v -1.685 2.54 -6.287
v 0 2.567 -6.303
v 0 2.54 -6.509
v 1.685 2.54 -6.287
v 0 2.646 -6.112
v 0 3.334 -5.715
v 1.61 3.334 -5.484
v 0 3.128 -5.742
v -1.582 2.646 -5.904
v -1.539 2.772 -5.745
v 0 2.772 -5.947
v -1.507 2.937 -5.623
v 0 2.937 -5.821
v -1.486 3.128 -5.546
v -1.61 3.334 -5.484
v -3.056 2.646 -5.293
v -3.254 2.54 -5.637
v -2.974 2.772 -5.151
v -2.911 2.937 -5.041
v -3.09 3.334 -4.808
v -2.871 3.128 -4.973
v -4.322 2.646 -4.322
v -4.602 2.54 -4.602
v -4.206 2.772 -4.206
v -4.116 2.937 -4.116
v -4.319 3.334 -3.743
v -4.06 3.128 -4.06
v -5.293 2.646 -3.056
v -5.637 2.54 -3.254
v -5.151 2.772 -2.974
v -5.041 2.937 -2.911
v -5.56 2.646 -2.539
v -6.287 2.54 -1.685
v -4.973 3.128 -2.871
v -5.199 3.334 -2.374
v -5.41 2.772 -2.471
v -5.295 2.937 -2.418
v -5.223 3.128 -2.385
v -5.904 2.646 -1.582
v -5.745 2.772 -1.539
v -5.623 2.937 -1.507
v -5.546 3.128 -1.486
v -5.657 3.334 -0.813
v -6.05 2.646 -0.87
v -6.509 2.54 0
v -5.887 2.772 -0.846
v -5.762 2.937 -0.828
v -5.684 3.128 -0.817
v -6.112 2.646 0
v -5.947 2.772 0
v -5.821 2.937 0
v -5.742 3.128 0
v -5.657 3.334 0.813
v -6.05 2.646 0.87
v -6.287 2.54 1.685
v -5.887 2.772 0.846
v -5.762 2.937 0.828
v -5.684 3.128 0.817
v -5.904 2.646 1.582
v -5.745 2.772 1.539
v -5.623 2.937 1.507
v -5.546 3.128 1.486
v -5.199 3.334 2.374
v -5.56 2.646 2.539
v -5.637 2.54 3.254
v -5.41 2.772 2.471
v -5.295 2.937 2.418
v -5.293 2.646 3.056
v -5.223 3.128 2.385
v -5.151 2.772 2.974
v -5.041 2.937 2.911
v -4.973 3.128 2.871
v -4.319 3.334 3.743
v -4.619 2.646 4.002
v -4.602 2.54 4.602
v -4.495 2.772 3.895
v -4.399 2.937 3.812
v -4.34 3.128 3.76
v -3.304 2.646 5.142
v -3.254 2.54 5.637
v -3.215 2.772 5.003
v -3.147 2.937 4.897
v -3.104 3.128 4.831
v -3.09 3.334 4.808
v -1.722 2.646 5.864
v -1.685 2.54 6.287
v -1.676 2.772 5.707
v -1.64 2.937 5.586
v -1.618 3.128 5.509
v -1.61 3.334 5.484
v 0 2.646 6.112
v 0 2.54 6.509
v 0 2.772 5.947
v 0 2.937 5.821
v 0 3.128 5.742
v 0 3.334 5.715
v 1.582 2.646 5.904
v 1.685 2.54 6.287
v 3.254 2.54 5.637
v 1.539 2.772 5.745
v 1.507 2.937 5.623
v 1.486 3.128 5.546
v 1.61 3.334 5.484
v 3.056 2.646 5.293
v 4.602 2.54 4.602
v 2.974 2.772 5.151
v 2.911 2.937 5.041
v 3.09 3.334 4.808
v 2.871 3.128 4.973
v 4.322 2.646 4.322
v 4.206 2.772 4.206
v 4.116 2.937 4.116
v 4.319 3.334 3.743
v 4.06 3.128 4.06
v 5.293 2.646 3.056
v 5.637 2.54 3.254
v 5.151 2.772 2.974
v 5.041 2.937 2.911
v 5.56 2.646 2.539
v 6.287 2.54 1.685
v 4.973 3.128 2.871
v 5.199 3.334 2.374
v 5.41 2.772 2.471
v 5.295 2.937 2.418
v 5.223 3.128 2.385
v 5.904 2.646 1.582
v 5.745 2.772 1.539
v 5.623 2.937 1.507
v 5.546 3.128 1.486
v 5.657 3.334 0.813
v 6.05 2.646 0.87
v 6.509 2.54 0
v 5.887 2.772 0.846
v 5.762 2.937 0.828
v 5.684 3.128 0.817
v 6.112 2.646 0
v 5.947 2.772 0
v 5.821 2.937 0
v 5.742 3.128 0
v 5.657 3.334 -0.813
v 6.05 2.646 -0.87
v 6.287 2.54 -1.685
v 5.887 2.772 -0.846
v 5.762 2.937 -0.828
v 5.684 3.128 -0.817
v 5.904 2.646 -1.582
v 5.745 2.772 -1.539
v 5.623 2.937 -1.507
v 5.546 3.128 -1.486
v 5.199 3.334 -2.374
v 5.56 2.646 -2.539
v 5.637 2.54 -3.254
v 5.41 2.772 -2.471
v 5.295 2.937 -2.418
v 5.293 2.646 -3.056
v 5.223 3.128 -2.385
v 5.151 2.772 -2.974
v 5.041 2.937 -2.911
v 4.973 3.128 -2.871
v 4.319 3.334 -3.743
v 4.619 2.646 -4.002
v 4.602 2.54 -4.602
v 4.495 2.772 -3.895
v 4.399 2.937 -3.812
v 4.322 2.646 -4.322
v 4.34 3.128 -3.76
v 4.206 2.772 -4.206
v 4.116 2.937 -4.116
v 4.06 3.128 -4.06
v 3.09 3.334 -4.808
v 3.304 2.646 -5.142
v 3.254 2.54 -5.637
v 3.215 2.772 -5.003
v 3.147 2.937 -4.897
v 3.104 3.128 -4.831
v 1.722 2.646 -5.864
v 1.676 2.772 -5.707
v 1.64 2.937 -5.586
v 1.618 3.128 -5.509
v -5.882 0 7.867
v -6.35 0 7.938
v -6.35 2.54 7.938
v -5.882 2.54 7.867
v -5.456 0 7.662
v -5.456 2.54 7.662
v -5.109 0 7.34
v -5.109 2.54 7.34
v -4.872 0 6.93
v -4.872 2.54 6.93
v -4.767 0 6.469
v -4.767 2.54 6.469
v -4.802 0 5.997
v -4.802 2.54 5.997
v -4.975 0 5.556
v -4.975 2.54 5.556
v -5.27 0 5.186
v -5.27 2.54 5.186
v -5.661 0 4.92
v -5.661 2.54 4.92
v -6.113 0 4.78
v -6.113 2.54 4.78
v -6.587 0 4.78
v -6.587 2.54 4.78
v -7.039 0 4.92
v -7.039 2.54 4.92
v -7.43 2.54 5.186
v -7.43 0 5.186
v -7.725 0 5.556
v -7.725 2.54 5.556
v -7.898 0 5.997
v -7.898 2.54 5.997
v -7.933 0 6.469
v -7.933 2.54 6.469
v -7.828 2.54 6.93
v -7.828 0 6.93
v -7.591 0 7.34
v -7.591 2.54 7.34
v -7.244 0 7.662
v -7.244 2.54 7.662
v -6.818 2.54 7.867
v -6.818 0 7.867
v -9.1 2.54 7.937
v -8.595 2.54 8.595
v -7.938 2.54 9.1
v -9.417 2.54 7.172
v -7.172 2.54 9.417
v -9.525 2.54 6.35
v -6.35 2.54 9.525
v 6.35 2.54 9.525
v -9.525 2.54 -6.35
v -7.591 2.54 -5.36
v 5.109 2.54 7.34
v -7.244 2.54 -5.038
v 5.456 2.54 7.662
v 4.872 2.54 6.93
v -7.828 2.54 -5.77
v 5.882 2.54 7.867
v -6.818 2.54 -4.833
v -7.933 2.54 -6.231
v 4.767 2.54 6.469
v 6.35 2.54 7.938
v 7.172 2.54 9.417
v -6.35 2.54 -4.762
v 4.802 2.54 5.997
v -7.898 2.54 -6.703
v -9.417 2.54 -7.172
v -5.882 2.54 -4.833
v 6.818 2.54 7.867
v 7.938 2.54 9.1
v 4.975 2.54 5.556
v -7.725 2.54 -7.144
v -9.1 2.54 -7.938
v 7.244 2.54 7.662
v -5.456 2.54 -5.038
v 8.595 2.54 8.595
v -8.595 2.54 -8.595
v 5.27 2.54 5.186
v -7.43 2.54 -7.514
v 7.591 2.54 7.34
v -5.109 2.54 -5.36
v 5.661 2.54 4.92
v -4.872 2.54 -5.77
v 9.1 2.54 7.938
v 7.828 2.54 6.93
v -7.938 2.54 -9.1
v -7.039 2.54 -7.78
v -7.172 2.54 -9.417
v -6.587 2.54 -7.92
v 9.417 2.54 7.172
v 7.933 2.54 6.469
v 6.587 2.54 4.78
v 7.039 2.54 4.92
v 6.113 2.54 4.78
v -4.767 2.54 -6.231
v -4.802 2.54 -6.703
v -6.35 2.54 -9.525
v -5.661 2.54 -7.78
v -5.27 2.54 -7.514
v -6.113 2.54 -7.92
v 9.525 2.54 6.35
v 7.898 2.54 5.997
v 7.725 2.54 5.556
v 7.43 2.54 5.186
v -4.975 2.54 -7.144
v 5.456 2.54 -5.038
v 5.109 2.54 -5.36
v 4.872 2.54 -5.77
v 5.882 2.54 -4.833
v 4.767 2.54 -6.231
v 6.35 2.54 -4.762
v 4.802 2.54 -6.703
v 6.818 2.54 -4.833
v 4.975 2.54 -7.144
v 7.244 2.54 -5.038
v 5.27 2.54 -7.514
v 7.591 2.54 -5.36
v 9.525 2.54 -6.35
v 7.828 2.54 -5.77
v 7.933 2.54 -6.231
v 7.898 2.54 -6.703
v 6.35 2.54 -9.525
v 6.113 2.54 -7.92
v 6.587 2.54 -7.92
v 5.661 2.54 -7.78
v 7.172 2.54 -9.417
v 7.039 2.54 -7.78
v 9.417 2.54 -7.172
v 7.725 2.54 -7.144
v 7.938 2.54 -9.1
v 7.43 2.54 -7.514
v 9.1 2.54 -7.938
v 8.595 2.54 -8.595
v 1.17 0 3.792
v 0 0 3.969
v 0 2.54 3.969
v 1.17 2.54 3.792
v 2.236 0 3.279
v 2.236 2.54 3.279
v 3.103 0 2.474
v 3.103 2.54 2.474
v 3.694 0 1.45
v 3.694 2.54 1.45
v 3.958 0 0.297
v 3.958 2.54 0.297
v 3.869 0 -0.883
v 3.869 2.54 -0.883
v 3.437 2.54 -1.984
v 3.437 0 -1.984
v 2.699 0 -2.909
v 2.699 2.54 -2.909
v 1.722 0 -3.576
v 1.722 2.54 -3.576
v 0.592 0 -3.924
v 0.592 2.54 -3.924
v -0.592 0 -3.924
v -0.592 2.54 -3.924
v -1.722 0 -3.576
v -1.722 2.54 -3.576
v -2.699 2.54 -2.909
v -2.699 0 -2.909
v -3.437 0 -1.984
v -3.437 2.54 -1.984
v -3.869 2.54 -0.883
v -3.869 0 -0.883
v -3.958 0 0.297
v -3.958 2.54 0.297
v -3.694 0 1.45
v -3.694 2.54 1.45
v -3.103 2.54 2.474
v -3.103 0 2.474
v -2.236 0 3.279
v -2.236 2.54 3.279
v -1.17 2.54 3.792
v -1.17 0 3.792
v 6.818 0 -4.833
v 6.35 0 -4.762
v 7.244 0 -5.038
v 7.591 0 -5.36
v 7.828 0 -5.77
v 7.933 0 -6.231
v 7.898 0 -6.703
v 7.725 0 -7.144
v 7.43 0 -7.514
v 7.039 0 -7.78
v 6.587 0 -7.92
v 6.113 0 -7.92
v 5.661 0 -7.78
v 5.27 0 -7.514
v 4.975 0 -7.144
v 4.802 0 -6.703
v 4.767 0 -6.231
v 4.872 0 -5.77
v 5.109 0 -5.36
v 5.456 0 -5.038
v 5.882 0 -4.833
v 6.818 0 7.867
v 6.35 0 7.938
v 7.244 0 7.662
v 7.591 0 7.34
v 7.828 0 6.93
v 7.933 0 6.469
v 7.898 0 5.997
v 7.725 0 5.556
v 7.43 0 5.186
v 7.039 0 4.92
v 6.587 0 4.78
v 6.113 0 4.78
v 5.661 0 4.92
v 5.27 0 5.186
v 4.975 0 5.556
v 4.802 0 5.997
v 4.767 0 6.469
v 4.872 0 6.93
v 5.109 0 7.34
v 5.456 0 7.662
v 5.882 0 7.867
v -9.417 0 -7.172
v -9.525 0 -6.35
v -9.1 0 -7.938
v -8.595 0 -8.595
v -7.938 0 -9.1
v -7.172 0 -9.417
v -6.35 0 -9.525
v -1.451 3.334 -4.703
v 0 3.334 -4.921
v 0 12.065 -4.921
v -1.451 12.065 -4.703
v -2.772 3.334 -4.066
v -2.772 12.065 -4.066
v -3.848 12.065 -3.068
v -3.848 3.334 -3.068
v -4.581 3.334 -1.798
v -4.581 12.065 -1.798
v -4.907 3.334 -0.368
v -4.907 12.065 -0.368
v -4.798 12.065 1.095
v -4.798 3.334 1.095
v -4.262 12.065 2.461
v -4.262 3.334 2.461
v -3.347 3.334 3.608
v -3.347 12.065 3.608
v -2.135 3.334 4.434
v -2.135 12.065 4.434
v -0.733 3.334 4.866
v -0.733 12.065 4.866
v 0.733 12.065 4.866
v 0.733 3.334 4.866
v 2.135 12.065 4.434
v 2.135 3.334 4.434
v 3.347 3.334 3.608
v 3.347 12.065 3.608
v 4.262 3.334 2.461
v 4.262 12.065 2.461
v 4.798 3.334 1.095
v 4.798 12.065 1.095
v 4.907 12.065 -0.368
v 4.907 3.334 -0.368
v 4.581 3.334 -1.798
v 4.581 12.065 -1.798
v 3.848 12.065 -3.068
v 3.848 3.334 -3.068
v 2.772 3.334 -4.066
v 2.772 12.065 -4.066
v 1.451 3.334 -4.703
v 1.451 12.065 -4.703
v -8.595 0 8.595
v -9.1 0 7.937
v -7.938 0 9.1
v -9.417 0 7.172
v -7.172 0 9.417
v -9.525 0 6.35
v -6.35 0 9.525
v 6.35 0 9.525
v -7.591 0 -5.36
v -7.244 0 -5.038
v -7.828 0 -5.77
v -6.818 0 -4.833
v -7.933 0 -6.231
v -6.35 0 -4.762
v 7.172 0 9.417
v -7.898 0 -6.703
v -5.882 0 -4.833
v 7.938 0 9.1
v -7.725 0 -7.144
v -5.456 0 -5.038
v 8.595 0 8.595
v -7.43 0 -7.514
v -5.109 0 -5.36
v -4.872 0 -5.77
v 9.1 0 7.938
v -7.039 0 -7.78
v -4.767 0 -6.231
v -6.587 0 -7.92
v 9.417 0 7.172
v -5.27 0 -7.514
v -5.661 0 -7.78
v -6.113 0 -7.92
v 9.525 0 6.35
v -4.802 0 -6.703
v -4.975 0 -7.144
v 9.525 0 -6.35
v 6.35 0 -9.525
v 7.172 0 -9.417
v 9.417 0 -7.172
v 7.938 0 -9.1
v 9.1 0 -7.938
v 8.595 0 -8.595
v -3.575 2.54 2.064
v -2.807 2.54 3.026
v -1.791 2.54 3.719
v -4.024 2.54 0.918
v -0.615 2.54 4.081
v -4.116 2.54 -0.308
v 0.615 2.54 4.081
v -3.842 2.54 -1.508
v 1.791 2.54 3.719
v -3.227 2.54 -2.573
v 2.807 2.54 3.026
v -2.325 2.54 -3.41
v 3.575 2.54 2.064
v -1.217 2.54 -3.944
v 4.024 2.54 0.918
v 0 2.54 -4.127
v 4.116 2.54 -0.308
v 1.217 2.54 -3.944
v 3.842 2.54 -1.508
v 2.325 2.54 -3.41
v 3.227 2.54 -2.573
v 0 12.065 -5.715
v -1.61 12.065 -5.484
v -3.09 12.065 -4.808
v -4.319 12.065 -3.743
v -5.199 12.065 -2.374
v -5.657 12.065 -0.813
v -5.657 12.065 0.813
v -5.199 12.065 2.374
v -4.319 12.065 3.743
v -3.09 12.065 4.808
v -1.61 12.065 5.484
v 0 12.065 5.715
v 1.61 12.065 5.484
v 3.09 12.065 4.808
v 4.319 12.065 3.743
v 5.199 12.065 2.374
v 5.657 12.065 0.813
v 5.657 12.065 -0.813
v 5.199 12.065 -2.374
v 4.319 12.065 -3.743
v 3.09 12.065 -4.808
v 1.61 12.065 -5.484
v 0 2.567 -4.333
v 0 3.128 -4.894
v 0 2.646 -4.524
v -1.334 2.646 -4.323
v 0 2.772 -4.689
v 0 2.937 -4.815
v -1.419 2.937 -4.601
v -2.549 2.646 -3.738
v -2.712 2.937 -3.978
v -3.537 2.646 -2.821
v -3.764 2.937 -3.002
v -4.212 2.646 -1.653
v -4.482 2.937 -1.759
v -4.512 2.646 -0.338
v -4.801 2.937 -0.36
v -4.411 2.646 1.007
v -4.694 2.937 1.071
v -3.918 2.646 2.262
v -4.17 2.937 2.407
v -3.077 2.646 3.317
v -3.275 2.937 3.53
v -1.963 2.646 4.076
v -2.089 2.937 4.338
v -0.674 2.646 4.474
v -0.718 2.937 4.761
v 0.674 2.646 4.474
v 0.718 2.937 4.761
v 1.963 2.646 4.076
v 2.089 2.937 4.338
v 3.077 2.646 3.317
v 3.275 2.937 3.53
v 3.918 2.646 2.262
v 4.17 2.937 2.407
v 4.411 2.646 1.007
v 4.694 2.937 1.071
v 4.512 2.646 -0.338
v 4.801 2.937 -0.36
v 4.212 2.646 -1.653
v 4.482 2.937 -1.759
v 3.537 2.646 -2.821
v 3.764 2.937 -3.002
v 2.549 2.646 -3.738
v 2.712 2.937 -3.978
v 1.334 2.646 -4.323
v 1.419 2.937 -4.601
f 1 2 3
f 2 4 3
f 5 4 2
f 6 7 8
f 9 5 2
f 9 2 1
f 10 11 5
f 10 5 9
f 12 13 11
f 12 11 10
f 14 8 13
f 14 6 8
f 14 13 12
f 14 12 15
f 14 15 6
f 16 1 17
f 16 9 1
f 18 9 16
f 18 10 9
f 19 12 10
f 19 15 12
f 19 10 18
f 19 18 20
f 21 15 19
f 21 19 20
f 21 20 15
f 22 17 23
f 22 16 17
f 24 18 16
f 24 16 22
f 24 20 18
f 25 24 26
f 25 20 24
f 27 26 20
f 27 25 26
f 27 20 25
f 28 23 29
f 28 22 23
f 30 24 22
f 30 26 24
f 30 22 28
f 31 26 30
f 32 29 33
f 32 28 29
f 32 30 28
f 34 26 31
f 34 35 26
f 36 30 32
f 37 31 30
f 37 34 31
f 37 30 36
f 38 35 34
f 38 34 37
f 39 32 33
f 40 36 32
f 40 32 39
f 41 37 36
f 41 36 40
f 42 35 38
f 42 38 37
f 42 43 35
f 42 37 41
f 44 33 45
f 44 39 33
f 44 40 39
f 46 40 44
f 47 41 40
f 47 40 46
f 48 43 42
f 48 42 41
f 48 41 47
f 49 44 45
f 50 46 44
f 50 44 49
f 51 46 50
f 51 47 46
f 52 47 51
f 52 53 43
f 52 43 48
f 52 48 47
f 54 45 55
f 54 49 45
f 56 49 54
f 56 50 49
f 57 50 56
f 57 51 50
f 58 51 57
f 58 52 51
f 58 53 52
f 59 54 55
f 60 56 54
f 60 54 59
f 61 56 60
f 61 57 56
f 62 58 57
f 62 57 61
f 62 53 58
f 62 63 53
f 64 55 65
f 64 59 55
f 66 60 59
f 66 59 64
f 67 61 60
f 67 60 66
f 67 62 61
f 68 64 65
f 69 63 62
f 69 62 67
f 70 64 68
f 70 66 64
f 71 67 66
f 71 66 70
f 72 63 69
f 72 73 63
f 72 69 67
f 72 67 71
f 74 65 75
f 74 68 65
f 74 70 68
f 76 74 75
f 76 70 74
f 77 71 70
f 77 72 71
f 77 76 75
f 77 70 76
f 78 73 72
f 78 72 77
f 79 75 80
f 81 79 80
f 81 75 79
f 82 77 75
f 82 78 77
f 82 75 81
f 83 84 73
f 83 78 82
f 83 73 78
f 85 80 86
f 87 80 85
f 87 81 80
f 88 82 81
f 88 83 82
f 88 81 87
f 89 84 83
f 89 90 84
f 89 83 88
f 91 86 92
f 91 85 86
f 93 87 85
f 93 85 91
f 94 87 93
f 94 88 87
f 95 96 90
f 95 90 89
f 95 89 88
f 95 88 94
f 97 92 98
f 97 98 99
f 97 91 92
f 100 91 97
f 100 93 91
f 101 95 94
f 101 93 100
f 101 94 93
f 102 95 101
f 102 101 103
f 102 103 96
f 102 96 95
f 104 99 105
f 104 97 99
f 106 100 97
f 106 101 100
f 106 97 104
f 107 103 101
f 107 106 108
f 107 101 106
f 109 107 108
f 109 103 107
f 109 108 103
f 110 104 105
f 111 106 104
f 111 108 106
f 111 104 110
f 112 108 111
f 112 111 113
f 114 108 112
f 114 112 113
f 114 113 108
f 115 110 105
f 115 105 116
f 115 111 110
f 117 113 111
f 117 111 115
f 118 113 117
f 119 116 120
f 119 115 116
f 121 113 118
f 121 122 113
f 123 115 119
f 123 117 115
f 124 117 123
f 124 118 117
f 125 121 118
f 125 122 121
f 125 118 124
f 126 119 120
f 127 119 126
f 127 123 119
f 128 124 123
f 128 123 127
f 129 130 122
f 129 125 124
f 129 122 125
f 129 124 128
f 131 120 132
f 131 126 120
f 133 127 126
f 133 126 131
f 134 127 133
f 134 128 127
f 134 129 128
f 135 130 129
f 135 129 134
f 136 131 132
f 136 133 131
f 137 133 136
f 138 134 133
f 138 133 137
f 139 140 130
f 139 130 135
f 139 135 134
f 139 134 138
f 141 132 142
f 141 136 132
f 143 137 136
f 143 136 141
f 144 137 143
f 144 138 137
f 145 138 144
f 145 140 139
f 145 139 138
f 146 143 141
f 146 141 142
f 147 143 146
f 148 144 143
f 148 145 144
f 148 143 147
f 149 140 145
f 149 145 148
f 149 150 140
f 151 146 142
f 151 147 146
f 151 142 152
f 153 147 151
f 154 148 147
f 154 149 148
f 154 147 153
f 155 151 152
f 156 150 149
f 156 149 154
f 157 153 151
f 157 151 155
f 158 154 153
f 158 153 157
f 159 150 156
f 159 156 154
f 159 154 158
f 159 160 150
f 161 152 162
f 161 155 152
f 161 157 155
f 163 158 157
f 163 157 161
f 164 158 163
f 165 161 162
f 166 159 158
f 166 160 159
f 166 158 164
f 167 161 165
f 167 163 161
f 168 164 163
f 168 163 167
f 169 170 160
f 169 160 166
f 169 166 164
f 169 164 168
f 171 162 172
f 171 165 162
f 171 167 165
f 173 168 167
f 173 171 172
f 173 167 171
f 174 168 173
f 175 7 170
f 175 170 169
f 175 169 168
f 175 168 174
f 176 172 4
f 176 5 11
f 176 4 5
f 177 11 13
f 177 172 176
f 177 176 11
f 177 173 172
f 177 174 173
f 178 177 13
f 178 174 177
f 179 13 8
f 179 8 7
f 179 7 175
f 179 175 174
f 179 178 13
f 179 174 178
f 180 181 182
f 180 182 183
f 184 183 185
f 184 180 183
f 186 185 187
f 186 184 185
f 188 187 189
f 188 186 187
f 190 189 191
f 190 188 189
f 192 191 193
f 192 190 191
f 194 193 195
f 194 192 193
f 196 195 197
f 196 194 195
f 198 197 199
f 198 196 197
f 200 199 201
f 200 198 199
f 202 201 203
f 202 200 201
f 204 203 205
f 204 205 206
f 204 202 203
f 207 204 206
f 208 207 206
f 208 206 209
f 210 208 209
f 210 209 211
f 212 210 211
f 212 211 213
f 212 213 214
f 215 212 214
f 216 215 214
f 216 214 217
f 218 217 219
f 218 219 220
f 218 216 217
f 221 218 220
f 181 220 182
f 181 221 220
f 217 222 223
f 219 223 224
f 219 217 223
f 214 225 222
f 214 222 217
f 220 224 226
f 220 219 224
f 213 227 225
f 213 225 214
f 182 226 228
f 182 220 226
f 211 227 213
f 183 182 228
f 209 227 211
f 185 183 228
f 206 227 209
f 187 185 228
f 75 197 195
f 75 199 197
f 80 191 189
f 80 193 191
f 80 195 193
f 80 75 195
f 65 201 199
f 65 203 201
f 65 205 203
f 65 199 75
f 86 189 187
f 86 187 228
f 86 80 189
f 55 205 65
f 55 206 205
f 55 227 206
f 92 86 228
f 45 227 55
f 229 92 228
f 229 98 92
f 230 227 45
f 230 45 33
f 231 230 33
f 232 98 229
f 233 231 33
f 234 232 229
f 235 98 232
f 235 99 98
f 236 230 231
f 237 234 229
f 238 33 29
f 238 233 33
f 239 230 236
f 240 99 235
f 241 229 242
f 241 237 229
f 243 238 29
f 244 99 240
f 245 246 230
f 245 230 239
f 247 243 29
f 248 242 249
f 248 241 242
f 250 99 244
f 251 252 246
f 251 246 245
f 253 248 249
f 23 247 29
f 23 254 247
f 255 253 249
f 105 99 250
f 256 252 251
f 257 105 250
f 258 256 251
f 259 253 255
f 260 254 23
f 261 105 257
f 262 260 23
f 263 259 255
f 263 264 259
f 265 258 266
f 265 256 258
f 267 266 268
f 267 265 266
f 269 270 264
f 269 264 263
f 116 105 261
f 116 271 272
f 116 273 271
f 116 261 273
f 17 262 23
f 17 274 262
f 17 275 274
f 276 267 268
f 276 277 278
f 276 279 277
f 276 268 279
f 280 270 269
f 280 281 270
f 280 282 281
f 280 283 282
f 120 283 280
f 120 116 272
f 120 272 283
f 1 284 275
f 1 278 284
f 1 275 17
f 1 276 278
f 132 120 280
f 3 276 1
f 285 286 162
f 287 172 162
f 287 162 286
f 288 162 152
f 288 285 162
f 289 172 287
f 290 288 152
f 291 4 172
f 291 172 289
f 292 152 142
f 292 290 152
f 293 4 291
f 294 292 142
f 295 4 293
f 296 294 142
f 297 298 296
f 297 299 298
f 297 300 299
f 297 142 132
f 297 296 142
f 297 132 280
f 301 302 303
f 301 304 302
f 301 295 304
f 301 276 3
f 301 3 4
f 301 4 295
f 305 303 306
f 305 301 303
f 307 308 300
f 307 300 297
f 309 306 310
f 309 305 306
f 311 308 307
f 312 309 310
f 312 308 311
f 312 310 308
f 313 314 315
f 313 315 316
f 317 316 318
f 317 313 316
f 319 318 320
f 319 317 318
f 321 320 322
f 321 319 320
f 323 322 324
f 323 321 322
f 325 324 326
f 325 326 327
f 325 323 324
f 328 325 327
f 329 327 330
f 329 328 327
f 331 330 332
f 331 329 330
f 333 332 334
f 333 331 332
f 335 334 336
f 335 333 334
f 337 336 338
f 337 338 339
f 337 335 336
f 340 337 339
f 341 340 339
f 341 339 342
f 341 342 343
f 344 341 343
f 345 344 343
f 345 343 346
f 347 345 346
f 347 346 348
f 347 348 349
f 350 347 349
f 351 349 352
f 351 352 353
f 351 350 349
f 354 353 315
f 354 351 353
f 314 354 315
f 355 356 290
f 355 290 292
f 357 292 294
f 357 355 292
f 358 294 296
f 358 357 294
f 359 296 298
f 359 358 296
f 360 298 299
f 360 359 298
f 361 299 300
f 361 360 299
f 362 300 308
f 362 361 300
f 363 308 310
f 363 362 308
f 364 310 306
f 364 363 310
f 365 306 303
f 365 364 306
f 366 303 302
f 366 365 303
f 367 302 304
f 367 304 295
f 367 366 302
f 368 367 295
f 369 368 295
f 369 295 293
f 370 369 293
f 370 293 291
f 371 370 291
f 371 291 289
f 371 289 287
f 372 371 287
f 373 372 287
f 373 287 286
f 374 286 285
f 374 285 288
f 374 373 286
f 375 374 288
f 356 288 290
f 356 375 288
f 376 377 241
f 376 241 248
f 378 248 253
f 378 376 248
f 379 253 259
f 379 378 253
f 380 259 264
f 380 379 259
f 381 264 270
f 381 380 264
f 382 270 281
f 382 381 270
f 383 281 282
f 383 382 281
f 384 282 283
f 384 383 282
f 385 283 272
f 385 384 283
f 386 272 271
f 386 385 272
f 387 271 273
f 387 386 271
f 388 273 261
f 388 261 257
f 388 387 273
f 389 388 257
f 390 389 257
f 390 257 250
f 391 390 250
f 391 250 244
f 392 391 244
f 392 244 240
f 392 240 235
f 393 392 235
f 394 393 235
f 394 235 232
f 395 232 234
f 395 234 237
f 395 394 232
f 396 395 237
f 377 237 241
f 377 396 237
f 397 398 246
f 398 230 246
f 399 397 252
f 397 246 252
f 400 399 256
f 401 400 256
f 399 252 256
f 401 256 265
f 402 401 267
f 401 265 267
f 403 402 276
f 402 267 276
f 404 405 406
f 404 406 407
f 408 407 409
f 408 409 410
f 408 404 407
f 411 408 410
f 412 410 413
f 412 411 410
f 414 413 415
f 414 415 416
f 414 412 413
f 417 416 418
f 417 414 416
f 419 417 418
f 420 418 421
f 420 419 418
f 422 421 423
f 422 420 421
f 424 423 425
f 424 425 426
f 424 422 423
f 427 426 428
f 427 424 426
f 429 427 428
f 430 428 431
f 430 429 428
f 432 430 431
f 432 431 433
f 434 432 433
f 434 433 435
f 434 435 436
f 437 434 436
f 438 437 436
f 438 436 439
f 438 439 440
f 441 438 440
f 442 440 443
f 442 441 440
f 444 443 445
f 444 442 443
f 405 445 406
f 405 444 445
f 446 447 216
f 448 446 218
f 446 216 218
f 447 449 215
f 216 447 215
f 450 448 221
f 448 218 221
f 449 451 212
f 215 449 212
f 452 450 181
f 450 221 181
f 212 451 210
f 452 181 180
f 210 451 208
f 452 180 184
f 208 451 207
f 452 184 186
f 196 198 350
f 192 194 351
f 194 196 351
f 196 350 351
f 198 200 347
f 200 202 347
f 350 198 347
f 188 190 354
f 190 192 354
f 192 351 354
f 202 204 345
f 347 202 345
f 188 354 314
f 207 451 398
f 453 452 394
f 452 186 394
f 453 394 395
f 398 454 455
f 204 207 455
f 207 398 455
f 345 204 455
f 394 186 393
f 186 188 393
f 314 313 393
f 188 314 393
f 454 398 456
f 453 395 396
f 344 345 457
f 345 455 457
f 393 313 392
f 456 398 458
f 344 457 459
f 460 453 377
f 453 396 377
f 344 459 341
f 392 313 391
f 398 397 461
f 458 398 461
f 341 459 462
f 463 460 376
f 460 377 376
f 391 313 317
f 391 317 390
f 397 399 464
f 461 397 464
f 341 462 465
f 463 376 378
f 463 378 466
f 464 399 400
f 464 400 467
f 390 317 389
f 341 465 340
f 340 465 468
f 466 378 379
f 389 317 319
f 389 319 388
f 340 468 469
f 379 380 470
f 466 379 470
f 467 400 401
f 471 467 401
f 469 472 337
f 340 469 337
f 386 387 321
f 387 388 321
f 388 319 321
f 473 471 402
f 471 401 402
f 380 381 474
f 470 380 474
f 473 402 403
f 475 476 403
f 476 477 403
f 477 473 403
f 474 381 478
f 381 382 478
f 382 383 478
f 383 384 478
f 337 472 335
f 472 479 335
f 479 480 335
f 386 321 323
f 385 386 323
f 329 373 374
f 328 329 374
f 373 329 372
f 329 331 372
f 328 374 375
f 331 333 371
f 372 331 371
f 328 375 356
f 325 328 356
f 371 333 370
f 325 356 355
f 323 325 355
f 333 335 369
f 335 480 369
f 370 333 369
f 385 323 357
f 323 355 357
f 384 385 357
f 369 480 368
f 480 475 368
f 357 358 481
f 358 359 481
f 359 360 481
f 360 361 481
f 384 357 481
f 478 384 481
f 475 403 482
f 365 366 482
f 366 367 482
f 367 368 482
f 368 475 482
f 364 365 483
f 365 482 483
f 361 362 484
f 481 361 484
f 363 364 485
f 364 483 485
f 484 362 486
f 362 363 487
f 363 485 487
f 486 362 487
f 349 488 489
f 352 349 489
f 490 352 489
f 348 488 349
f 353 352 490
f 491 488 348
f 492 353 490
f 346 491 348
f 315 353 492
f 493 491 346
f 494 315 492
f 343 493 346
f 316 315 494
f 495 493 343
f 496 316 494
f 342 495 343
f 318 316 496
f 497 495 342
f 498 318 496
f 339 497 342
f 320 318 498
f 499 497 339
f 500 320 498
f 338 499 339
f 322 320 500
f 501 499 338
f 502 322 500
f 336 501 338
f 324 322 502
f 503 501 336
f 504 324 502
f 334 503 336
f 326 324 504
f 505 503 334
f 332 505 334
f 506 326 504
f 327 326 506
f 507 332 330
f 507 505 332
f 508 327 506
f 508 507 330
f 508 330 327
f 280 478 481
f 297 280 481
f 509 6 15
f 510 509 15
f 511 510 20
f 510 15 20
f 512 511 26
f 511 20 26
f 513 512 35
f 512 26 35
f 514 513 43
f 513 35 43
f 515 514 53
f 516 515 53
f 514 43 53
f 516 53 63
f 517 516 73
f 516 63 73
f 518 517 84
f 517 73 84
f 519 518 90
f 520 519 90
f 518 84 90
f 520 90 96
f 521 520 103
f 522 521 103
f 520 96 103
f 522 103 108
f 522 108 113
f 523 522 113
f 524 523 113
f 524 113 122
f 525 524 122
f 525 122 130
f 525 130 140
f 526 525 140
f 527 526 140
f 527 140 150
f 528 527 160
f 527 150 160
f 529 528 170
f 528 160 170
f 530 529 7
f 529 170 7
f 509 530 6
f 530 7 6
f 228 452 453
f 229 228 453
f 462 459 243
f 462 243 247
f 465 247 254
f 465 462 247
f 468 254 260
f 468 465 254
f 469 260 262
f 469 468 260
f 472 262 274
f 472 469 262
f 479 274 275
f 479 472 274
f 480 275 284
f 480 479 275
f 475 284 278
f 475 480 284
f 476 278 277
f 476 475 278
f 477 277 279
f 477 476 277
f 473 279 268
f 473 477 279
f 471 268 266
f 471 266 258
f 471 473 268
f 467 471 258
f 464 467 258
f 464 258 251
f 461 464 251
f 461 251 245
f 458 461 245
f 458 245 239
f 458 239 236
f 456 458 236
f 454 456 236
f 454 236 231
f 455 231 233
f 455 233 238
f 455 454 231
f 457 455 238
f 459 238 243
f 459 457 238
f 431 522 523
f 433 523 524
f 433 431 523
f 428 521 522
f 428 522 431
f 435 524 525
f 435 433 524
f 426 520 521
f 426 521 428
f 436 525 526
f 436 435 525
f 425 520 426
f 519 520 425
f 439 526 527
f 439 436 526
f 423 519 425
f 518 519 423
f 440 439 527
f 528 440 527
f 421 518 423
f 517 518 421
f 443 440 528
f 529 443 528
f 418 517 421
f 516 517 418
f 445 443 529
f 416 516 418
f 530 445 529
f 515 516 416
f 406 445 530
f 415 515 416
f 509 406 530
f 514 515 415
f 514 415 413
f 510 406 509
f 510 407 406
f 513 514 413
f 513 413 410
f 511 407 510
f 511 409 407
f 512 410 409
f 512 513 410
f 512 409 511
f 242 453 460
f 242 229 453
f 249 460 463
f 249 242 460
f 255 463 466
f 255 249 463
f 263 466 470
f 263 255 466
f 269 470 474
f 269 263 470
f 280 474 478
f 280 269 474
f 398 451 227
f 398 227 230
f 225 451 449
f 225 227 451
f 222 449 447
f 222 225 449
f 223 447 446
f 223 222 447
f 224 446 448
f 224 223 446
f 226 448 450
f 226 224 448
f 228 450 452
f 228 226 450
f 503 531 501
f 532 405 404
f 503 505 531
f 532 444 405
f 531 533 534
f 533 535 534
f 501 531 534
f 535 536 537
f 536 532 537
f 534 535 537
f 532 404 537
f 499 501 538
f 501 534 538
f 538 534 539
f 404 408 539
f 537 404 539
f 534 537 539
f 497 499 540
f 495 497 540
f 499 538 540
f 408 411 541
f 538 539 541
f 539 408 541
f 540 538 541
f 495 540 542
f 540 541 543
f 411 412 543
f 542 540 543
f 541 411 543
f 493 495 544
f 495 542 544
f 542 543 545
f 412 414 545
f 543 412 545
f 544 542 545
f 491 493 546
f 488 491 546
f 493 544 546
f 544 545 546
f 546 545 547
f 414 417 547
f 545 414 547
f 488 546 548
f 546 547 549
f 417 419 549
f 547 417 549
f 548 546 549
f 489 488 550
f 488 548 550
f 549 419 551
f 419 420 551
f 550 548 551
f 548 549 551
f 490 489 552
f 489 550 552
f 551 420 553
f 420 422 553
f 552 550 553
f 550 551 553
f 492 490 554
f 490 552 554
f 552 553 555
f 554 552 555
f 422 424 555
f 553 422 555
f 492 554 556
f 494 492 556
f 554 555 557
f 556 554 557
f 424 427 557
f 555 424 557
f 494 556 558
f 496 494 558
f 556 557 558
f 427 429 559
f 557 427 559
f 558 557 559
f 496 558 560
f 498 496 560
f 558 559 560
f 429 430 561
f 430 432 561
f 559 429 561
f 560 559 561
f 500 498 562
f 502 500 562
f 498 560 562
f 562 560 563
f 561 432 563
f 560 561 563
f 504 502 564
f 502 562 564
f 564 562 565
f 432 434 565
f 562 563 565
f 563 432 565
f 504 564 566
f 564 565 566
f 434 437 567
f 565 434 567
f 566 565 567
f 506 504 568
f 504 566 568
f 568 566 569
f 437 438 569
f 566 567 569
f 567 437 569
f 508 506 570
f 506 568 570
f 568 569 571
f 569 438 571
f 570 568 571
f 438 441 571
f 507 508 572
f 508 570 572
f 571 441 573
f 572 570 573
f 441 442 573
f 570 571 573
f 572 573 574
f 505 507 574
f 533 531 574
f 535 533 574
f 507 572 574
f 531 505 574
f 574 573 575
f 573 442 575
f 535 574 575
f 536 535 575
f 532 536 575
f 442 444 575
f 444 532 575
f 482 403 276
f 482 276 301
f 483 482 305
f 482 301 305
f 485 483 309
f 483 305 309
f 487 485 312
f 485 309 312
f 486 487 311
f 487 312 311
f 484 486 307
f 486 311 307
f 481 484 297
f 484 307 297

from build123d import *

# Parameters (mm, degrees)
SKETCH1_W           = 19.05
SKETCH1_H           = 19.05
SKETCH1_R           = 1.5875
SKETCH1_R_2         = 3.96875
BOSS_EXTRUDE1_DEPTH = 2.54
SKETCH2_R           = 5.715
SKETCH2_R_2         = 4.92125
BOSS_EXTRUDE2_DEPTH = 9.525
FILLET1_R           = 0.79375
FILLET2_R           = 3.175


with BuildPart() as part:
    # Sketch1 → Boss-Extrude1 (new body)
    with BuildSketch(Plane(origin=(0, 0, 0), x_dir=(1, 0, 0), z_dir=(0, 1, 0))):
        Rectangle(SKETCH1_W, SKETCH1_H)
        with Locations(Location((-6.35, 6.35, 0), (0, 0, 270))):
            Circle(SKETCH1_R, mode=Mode.SUBTRACT)
        with Locations(Location((6.35, 6.35, 0), (0, 0, 270))):
            Circle(SKETCH1_R, mode=Mode.SUBTRACT)
        with Locations(Location((6.35, -6.35, 0), (0, 0, 270))):
            Circle(SKETCH1_R, mode=Mode.SUBTRACT)
        with Locations(Location((-6.35, -6.35, 0), (0, 0, 270))):
            Circle(SKETCH1_R, mode=Mode.SUBTRACT)
        with Locations(Location((0, 0, 0), (0, 0, 270))):
            Circle(SKETCH1_R_2, mode=Mode.SUBTRACT)
    extrude(amount=BOSS_EXTRUDE1_DEPTH)

    # Sketch2 → Boss-Extrude2 (add)
    with BuildSketch(Plane(origin=(0, 2.54, 0), x_dir=(1, 0, 0), z_dir=(0, 1, 0))):
        with Locations(Location((0, 0, 0), (0, 0, 90))):
            Circle(SKETCH2_R)
        with Locations(Location((0, 0, 0), (0, 0, 90))):
            Circle(SKETCH2_R_2, mode=Mode.SUBTRACT)
    extrude(amount=BOSS_EXTRUDE2_DEPTH)

    # Fillet1
    fillet1_edges = [part.edges().sort_by_distance(p)[0] for p in [
        (0, 2.54, 5.715),
        (0, 2.54, 4.92125),
    ]]
    fillet(fillet1_edges, radius=FILLET1_R)

    # Fillet2
    fillet2_edges = [part.edges().sort_by_distance(p)[0] for p in [
        (9.525, 1.27, 9.525),
        (-9.525, 1.27, 9.525),
        (-9.525, 1.27, -9.525),
        (9.525, 1.27, -9.525),
    ]]
    fillet(fillet2_edges, radius=FILLET2_R)


solid = part.part
